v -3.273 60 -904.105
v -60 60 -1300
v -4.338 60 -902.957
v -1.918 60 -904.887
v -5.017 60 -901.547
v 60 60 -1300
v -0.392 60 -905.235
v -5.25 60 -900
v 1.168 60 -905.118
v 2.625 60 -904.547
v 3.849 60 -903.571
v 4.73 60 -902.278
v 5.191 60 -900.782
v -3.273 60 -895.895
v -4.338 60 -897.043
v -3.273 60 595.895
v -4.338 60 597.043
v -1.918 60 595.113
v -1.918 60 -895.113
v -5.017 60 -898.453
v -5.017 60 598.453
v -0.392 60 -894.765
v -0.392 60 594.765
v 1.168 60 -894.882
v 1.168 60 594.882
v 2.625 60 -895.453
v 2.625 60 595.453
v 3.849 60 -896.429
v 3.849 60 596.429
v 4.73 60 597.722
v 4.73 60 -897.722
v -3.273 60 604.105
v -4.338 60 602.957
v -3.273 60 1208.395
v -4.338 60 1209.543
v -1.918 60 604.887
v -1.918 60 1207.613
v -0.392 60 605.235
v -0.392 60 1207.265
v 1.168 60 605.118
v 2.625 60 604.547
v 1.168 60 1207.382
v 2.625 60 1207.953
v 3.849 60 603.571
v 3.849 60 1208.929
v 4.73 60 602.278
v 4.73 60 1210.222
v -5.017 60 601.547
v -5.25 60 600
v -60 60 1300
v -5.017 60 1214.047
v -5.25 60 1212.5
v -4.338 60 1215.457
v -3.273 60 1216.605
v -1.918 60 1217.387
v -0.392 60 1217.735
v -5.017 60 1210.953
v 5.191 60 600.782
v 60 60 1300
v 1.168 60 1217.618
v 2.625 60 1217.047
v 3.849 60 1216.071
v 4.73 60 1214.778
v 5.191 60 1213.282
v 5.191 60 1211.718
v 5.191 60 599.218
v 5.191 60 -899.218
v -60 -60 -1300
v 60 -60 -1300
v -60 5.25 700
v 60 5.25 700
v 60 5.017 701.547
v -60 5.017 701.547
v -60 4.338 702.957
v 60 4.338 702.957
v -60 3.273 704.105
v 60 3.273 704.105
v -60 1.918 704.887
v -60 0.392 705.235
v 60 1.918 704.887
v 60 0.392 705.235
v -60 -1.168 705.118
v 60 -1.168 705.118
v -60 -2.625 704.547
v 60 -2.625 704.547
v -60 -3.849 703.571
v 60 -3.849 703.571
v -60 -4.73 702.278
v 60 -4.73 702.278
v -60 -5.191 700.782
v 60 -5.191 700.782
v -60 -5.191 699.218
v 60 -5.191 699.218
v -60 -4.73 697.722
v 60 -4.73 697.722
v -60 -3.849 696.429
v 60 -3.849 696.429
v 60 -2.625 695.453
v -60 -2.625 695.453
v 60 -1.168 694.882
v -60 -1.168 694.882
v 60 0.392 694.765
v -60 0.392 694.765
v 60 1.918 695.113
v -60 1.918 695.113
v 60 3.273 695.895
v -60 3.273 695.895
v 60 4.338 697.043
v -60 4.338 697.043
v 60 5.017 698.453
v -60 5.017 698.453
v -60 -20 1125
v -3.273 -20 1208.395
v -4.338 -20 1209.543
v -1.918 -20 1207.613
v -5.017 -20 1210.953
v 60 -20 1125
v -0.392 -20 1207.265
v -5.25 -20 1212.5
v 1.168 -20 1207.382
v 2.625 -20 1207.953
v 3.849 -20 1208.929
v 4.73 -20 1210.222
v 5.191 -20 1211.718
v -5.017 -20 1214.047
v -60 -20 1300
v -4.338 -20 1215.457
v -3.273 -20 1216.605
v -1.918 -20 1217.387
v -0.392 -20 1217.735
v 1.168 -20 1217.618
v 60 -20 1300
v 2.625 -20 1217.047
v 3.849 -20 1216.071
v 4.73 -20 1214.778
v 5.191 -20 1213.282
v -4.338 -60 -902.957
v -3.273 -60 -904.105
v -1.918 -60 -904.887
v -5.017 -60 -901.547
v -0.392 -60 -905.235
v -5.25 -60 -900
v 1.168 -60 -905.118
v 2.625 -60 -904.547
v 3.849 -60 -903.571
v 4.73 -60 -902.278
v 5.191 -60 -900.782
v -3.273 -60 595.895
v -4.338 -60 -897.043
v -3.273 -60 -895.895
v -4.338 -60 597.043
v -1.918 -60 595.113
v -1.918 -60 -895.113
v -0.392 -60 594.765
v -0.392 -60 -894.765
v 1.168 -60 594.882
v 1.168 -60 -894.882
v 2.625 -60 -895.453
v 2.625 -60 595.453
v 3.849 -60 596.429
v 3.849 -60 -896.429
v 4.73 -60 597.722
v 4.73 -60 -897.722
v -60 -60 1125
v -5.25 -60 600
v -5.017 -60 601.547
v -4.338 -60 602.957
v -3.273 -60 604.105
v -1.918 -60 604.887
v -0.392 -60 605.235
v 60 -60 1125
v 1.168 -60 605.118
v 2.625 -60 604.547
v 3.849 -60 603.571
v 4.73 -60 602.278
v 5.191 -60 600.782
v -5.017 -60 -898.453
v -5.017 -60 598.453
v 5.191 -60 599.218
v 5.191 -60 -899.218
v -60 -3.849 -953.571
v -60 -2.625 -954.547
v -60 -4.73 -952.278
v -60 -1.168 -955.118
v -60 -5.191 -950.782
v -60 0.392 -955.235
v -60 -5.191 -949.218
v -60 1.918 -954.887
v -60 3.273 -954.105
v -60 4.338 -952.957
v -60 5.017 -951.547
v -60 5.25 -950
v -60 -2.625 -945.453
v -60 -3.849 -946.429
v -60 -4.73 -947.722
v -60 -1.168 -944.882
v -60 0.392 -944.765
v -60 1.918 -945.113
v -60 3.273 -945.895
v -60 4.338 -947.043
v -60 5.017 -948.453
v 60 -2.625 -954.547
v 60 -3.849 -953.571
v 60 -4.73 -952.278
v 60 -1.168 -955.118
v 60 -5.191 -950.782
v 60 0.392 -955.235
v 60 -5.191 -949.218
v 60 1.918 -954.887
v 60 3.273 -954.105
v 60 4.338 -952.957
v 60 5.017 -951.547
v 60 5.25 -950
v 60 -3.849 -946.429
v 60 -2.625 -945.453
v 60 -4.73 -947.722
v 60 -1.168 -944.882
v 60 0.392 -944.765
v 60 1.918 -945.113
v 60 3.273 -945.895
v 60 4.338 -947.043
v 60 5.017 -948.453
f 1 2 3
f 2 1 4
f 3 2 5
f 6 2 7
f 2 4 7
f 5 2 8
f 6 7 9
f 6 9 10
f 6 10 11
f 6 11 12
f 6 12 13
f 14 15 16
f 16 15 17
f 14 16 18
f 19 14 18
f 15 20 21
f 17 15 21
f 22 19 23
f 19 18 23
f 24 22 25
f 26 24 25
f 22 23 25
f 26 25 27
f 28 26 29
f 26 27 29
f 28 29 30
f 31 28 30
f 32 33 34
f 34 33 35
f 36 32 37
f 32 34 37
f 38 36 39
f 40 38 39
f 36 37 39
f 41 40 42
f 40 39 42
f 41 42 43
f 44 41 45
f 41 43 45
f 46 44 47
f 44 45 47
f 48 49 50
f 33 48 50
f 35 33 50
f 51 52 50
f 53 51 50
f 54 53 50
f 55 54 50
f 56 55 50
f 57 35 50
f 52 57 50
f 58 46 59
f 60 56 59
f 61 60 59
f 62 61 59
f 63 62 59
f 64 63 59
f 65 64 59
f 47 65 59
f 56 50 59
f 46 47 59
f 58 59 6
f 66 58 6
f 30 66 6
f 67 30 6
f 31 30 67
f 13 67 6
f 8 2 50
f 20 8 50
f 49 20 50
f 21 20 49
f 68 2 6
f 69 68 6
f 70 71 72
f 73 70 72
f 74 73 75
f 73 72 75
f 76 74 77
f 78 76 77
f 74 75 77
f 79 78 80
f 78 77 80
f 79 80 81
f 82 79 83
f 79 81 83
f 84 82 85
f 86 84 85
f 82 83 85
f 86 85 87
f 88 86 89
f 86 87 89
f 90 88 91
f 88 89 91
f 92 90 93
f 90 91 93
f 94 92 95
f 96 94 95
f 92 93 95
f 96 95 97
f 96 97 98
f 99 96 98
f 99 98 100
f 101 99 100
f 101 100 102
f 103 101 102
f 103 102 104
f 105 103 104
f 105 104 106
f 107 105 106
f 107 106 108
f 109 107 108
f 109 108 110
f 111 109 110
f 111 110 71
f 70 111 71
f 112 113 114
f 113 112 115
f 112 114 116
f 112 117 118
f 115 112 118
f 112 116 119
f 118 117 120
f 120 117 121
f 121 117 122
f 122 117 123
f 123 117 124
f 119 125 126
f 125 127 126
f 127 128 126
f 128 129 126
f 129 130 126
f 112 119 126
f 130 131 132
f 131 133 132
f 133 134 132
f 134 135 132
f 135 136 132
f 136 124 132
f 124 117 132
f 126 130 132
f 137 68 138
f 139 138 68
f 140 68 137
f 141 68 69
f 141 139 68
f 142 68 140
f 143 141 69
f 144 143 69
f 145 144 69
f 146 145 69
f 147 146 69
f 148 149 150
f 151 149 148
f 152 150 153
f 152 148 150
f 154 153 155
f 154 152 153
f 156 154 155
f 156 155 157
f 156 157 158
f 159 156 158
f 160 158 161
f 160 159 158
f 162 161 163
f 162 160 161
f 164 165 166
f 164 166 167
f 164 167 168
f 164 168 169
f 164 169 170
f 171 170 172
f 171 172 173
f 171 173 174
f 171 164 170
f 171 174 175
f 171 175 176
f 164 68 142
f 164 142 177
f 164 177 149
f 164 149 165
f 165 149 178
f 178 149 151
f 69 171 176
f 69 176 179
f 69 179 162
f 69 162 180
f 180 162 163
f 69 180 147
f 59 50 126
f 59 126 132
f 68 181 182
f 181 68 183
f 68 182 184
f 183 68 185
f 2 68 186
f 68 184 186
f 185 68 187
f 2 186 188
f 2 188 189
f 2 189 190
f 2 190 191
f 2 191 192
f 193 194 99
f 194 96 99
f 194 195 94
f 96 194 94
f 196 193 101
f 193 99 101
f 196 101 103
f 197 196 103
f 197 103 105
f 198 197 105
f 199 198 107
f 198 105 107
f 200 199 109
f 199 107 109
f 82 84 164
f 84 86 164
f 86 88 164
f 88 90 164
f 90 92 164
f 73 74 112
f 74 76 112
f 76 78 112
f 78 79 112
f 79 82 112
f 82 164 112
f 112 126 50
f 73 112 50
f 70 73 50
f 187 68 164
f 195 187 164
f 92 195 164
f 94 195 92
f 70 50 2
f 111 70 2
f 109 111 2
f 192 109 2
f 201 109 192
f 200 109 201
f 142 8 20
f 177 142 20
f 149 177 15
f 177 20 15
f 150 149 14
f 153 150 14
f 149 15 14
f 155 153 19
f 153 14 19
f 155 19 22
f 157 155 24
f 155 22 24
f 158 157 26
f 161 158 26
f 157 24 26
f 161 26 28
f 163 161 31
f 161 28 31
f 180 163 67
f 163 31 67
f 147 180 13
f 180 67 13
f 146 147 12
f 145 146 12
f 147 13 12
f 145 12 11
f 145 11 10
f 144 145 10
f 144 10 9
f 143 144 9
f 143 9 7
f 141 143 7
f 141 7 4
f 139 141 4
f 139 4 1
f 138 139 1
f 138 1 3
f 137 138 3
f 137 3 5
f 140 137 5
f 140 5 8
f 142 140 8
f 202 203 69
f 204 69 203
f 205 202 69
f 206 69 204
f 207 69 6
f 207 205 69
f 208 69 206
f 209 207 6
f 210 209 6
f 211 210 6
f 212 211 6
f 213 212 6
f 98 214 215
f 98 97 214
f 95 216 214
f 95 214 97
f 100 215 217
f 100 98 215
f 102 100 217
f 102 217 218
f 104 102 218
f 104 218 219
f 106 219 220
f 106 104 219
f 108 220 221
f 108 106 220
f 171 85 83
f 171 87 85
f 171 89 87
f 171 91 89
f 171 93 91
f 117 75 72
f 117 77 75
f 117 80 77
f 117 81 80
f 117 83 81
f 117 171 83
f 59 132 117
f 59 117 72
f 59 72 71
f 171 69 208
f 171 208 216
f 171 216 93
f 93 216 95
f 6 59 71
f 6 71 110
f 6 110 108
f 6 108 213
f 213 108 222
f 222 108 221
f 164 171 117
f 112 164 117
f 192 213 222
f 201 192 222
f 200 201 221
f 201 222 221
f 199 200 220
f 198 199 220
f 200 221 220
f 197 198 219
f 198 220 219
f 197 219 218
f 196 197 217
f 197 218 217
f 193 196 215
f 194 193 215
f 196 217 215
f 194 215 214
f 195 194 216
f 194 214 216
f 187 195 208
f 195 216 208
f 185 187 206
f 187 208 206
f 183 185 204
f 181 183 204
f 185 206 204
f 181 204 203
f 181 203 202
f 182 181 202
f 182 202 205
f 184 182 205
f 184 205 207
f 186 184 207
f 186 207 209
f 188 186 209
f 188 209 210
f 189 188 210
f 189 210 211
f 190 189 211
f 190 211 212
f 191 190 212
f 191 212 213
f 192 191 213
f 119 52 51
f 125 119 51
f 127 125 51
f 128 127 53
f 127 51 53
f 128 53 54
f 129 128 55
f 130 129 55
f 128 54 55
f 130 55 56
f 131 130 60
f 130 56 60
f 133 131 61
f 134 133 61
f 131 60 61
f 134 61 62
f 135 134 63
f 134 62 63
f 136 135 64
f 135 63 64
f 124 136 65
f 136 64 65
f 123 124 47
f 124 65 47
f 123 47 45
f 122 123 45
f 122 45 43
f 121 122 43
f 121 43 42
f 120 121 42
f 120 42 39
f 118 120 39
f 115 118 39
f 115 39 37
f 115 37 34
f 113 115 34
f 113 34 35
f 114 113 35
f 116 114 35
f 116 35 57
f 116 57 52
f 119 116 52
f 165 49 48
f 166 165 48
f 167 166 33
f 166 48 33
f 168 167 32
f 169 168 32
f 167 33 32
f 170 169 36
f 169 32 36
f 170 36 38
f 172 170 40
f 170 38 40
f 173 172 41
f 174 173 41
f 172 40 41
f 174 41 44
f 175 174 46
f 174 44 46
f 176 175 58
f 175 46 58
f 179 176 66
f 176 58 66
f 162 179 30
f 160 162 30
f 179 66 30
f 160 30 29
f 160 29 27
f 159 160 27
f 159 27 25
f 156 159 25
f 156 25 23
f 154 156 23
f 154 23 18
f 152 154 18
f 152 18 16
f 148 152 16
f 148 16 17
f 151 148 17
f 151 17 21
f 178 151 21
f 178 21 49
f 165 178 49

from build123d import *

# Parameters (mm, degrees)
F0_W     = 120
F0_H     = 120
F1_DEPTH = 1300
F2_W     = 40
F2_H     = 175
F3_DEPTH = 120
F4_R     = 5.25
F5_DEPTH = 120.001
F6_R     = 5.25
F7_DEPTH = 120.001


with BuildPart() as f1:
    # F0 (on Top) → F1 (new body, symmetric)
    with BuildSketch(Plane.XY):
        Rectangle(F0_W, F0_H)
    extrude(amount=F1_DEPTH, both=True)

    # F2 (on face) → F3 (cut, through all)
    with BuildSketch(Plane.YZ.offset(60)):
        with Locations((-40, 1212.5)):
            Rectangle(F2_W, F2_H)
    extrude(amount=-F3_DEPTH, mode=Mode.SUBTRACT)

    # F4 (on face) → F5 (cut, through all)
    with BuildSketch(Plane(origin=(0, 60, 0), x_dir=(-1, 0, 0), z_dir=(0, 1, 0))):
        with Locations((0, 1212.5)):
            Circle(F4_R)
        with Locations((0, -900)):
            Circle(F4_R)
        with Locations((0, 600)):
            Circle(F4_R)
    extrude(amount=-F5_DEPTH, mode=Mode.SUBTRACT)

    # F6 (on face) → F7 (cut, through all)
    with BuildSketch(Plane.YZ.offset(60)):
        with Locations((0, -950)):
            Circle(F6_R)
        with Locations((0, 700)):
            Circle(F6_R)
    extrude(amount=-F7_DEPTH, mode=Mode.SUBTRACT)


solid = f1.part
